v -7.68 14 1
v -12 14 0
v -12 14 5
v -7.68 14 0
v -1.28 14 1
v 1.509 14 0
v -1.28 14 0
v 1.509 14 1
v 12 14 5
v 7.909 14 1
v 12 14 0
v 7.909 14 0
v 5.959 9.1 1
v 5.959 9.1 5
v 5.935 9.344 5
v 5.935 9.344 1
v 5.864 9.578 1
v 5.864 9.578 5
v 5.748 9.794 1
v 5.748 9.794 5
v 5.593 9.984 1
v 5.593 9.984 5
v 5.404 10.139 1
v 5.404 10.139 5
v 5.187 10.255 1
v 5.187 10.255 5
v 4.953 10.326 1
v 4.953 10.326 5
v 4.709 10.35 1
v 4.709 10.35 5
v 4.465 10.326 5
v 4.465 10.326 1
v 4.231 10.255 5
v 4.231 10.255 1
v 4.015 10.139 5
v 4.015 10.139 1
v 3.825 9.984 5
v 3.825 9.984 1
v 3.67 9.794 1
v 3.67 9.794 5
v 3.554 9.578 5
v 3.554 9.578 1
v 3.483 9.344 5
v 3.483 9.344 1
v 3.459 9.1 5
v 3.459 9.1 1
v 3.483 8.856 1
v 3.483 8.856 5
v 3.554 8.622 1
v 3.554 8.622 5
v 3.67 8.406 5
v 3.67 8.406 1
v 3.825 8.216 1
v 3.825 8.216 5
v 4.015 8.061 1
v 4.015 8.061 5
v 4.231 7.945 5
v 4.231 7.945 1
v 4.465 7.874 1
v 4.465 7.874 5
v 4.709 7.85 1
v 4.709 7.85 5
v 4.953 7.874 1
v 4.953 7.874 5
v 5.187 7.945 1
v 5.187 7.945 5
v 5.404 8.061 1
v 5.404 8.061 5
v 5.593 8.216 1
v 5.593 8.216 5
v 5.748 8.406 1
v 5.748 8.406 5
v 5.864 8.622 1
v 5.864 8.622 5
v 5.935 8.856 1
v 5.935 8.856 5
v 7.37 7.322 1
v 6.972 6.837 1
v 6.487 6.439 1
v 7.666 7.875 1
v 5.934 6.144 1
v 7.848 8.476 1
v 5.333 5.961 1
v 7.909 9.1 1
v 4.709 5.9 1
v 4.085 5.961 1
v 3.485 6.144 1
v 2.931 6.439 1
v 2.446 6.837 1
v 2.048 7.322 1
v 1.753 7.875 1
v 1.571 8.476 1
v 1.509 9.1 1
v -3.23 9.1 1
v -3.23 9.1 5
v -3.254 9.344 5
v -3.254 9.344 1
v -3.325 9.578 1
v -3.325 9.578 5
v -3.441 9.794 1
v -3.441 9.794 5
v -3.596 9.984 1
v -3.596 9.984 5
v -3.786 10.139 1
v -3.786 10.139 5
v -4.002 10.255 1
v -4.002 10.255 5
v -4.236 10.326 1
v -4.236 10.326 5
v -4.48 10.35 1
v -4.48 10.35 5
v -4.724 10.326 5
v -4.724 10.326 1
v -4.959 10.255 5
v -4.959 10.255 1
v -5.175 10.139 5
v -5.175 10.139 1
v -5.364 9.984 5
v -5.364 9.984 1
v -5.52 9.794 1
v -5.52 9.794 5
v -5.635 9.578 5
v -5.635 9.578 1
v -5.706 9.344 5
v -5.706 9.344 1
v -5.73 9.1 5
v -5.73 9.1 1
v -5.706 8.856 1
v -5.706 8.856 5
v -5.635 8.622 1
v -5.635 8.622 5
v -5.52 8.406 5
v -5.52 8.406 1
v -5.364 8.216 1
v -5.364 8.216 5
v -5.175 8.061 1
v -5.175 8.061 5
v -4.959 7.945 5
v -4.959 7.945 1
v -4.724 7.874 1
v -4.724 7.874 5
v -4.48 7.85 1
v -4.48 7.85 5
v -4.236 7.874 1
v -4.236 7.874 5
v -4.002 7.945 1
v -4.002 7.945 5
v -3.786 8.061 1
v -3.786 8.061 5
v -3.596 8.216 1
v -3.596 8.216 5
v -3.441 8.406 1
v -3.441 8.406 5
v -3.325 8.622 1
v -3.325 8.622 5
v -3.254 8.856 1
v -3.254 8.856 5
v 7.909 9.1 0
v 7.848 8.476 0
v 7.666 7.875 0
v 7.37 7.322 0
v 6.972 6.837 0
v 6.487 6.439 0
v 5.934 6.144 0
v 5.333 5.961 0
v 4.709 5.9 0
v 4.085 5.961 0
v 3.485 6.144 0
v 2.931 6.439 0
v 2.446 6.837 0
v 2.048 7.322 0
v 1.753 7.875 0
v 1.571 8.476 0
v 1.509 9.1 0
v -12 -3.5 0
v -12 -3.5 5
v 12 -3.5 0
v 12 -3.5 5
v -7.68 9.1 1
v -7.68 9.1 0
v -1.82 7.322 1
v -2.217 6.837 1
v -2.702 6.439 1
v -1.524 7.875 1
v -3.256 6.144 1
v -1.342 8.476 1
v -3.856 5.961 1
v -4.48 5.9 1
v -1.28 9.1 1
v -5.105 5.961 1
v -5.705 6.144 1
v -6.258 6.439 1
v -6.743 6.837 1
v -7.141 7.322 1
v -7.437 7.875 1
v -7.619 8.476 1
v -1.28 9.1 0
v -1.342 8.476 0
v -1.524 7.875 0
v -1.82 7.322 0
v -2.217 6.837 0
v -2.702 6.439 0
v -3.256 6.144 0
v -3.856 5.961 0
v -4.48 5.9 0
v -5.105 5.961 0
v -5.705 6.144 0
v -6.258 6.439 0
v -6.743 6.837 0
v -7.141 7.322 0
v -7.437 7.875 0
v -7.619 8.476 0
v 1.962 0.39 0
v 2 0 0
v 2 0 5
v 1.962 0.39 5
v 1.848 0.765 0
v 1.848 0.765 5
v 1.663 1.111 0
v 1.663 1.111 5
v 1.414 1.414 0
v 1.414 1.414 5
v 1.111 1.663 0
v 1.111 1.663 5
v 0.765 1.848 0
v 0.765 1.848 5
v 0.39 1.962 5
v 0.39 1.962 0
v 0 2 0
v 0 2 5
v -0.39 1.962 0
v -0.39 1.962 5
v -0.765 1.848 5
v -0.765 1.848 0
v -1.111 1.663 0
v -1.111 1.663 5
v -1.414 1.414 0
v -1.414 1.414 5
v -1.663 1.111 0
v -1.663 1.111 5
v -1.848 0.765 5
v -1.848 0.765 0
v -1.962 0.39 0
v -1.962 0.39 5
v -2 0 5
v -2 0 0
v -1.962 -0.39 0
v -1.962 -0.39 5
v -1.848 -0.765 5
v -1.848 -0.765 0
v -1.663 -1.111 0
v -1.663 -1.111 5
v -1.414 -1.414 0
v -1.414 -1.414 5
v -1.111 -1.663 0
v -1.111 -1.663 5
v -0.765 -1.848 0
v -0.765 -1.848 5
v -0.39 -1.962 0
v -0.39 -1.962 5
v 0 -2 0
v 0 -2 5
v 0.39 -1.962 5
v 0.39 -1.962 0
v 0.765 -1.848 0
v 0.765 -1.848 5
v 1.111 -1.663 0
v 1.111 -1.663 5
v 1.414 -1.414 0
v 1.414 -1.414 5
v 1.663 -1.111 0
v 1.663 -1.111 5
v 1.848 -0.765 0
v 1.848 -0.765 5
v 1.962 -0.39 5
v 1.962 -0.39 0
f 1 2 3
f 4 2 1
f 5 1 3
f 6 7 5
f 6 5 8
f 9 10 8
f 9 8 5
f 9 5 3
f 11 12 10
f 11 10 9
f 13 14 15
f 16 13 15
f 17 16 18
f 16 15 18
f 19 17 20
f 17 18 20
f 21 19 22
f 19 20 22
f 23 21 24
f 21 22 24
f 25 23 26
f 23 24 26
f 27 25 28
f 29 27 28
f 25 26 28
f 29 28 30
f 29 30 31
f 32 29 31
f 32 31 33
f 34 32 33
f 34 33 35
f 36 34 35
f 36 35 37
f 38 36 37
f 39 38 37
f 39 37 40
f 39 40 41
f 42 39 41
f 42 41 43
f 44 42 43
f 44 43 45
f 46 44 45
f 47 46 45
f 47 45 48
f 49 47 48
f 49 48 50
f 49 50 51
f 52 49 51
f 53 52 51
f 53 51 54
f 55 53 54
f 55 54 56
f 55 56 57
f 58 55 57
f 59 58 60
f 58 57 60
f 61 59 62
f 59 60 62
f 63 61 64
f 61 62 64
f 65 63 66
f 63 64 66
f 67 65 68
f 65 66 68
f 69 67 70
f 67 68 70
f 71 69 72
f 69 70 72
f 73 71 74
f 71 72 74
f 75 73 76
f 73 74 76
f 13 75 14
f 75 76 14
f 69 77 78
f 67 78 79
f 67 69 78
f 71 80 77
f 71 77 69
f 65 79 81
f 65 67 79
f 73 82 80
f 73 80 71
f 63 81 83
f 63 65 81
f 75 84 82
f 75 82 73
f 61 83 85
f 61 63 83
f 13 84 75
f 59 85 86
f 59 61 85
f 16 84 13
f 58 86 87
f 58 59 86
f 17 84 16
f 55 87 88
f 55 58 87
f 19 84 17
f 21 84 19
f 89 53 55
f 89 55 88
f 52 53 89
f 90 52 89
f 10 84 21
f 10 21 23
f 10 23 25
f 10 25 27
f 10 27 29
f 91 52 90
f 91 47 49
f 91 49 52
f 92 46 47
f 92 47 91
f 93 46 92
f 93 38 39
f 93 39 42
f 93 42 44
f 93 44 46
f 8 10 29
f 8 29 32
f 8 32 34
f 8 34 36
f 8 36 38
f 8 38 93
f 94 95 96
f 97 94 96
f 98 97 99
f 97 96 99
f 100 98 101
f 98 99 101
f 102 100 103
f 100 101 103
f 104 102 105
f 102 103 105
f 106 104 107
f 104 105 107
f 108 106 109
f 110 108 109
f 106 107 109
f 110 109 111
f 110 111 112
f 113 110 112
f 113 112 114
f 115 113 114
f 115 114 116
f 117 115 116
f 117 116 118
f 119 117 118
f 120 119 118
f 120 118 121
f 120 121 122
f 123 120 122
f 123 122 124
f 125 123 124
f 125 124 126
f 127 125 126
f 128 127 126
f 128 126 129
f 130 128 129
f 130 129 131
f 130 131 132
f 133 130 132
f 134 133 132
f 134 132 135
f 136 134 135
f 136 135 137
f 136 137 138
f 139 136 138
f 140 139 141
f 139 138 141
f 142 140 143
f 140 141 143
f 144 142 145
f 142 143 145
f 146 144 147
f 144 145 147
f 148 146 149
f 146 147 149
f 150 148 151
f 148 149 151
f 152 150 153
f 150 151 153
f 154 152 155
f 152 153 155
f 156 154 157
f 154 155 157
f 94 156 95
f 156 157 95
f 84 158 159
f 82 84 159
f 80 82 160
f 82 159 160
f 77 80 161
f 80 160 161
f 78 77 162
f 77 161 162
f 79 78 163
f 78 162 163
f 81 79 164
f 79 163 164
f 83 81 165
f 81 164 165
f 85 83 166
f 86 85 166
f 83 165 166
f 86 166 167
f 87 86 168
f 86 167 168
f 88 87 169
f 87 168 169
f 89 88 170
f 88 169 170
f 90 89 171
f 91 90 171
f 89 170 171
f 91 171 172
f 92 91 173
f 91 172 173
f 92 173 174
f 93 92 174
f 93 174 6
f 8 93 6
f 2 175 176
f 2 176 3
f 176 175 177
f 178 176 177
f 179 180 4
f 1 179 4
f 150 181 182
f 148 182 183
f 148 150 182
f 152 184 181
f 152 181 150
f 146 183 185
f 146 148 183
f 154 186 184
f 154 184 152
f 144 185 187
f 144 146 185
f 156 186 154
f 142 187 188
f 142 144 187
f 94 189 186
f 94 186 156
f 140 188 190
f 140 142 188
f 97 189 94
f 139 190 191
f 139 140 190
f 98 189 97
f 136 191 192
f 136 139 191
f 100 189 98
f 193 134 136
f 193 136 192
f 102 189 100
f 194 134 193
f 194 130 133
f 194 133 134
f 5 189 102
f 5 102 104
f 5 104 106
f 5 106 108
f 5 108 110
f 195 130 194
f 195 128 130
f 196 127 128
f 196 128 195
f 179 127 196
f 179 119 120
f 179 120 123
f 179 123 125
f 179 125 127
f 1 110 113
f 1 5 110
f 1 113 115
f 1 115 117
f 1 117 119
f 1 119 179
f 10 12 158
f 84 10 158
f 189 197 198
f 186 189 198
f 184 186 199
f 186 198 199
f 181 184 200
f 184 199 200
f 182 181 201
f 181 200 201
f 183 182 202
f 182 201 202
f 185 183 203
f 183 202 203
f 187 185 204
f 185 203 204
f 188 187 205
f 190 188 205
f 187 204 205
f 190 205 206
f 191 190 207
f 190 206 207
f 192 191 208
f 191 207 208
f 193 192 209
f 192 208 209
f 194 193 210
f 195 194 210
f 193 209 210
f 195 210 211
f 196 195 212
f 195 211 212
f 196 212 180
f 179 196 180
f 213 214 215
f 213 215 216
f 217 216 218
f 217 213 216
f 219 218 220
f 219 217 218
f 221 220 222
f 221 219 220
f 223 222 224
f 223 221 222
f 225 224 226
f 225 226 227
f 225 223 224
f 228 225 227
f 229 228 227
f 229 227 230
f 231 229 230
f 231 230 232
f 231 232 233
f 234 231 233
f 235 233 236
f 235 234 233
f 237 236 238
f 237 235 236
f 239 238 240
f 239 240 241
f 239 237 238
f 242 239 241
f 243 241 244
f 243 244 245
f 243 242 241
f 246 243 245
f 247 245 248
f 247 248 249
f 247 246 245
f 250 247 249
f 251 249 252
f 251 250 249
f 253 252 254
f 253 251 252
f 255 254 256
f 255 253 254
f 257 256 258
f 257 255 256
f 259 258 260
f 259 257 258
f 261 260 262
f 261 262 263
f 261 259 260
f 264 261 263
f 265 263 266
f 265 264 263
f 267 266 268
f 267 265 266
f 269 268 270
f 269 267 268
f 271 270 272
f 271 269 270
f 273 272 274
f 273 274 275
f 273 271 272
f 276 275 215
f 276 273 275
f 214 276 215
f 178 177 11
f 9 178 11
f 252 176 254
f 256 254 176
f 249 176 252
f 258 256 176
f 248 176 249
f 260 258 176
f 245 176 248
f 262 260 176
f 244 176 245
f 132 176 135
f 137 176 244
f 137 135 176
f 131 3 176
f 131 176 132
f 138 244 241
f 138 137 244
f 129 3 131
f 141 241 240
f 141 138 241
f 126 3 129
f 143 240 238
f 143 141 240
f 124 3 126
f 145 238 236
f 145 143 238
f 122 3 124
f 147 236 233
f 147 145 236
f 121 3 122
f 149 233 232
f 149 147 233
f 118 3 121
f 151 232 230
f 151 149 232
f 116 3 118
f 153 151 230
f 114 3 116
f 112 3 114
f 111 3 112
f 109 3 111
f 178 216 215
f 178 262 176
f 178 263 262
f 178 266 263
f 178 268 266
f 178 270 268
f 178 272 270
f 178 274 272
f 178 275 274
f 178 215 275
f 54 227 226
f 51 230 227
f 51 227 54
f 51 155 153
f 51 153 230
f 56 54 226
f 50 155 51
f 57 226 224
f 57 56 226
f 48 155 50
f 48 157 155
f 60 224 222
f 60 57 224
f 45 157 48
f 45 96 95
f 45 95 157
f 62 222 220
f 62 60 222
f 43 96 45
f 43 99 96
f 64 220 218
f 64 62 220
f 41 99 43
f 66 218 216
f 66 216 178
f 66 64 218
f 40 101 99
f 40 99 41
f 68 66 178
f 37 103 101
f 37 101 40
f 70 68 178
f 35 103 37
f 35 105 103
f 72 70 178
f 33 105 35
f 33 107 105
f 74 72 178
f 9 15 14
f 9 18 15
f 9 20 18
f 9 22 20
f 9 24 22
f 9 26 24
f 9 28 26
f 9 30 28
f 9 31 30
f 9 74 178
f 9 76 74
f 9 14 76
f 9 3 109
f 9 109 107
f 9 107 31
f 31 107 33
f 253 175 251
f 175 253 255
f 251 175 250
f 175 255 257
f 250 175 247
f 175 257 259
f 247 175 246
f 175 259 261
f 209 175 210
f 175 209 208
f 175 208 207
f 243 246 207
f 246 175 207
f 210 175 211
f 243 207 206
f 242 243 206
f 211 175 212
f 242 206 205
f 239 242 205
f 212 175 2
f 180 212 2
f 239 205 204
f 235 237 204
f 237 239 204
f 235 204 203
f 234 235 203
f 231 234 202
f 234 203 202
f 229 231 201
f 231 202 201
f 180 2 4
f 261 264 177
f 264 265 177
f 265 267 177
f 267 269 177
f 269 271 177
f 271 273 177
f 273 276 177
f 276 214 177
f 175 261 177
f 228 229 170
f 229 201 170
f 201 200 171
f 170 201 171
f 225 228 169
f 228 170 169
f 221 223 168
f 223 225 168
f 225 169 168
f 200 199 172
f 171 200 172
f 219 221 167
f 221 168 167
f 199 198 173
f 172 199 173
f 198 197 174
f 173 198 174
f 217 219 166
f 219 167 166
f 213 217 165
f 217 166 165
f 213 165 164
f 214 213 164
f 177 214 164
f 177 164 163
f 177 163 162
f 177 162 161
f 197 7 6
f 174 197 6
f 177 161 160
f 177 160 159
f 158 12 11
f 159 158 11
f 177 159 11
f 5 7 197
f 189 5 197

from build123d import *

# Parameters (mm, degrees)
ESQUISSE1_W             = 24
ESQUISSE1_H             = 17.5
ESQUISSE1_R             = 2
EXTRUSION1_DEPTH        = 5
ENL_V_MAT_EXTRU_2_DEPTH = 1
TROU_TARAUD_M3X0_51_D   = 2.5


with BuildPart() as part:
    # Esquisse1 → Extrusion1 (new body)
    with BuildSketch(Plane.XY):
        with Locations((0, 5.25)):
            Rectangle(ESQUISSE1_W, ESQUISSE1_H)
        Circle(ESQUISSE1_R, mode=Mode.SUBTRACT)
    extrude(amount=EXTRUSION1_DEPTH)

    # Esquisse3 → Enlèv. mat.-Extru.2 (cut)
    with BuildSketch(Plane.XY):
        with BuildLine():
            Line((-7.680232556, 24.5), (-1.280232556, 24.5))
            Line((-1.280232556, 24.5), (-1.280232556, 9.1))
            ThreePointArc((-1.280232556, 9.1), (-4.480232556, 5.9), (-7.680232556, 9.1))
            Line((-7.680232556, 9.1), (-7.680232556, 24.5))
        make_face()
        with BuildLine():
            Line((1.509125657, 9.1), (1.509125657, 24.5))
            Line((1.509125657, 24.5), (7.909125657, 24.5))
            Line((7.909125657, 24.5), (7.909125657, 9.1))
            ThreePointArc((7.909125657, 9.1), (4.709125657, 5.9), (1.509125657, 9.1))
        make_face()
    extrude(amount=ENL_V_MAT_EXTRU_2_DEPTH, mode=Mode.SUBTRACT)

    # Trou taraudé M3x0.51 (through all)
    with Locations(Plane(origin=(-4.349577812, 3.543926442, 1), x_dir=(-1, 0, 0), z_dir=(0, 0, -1))):
        with Locations((0.130654744, 5.556073558), (-9.058703469, 5.556073558)):
            Hole(TROU_TARAUD_M3X0_51_D / 2)


solid = part.part
